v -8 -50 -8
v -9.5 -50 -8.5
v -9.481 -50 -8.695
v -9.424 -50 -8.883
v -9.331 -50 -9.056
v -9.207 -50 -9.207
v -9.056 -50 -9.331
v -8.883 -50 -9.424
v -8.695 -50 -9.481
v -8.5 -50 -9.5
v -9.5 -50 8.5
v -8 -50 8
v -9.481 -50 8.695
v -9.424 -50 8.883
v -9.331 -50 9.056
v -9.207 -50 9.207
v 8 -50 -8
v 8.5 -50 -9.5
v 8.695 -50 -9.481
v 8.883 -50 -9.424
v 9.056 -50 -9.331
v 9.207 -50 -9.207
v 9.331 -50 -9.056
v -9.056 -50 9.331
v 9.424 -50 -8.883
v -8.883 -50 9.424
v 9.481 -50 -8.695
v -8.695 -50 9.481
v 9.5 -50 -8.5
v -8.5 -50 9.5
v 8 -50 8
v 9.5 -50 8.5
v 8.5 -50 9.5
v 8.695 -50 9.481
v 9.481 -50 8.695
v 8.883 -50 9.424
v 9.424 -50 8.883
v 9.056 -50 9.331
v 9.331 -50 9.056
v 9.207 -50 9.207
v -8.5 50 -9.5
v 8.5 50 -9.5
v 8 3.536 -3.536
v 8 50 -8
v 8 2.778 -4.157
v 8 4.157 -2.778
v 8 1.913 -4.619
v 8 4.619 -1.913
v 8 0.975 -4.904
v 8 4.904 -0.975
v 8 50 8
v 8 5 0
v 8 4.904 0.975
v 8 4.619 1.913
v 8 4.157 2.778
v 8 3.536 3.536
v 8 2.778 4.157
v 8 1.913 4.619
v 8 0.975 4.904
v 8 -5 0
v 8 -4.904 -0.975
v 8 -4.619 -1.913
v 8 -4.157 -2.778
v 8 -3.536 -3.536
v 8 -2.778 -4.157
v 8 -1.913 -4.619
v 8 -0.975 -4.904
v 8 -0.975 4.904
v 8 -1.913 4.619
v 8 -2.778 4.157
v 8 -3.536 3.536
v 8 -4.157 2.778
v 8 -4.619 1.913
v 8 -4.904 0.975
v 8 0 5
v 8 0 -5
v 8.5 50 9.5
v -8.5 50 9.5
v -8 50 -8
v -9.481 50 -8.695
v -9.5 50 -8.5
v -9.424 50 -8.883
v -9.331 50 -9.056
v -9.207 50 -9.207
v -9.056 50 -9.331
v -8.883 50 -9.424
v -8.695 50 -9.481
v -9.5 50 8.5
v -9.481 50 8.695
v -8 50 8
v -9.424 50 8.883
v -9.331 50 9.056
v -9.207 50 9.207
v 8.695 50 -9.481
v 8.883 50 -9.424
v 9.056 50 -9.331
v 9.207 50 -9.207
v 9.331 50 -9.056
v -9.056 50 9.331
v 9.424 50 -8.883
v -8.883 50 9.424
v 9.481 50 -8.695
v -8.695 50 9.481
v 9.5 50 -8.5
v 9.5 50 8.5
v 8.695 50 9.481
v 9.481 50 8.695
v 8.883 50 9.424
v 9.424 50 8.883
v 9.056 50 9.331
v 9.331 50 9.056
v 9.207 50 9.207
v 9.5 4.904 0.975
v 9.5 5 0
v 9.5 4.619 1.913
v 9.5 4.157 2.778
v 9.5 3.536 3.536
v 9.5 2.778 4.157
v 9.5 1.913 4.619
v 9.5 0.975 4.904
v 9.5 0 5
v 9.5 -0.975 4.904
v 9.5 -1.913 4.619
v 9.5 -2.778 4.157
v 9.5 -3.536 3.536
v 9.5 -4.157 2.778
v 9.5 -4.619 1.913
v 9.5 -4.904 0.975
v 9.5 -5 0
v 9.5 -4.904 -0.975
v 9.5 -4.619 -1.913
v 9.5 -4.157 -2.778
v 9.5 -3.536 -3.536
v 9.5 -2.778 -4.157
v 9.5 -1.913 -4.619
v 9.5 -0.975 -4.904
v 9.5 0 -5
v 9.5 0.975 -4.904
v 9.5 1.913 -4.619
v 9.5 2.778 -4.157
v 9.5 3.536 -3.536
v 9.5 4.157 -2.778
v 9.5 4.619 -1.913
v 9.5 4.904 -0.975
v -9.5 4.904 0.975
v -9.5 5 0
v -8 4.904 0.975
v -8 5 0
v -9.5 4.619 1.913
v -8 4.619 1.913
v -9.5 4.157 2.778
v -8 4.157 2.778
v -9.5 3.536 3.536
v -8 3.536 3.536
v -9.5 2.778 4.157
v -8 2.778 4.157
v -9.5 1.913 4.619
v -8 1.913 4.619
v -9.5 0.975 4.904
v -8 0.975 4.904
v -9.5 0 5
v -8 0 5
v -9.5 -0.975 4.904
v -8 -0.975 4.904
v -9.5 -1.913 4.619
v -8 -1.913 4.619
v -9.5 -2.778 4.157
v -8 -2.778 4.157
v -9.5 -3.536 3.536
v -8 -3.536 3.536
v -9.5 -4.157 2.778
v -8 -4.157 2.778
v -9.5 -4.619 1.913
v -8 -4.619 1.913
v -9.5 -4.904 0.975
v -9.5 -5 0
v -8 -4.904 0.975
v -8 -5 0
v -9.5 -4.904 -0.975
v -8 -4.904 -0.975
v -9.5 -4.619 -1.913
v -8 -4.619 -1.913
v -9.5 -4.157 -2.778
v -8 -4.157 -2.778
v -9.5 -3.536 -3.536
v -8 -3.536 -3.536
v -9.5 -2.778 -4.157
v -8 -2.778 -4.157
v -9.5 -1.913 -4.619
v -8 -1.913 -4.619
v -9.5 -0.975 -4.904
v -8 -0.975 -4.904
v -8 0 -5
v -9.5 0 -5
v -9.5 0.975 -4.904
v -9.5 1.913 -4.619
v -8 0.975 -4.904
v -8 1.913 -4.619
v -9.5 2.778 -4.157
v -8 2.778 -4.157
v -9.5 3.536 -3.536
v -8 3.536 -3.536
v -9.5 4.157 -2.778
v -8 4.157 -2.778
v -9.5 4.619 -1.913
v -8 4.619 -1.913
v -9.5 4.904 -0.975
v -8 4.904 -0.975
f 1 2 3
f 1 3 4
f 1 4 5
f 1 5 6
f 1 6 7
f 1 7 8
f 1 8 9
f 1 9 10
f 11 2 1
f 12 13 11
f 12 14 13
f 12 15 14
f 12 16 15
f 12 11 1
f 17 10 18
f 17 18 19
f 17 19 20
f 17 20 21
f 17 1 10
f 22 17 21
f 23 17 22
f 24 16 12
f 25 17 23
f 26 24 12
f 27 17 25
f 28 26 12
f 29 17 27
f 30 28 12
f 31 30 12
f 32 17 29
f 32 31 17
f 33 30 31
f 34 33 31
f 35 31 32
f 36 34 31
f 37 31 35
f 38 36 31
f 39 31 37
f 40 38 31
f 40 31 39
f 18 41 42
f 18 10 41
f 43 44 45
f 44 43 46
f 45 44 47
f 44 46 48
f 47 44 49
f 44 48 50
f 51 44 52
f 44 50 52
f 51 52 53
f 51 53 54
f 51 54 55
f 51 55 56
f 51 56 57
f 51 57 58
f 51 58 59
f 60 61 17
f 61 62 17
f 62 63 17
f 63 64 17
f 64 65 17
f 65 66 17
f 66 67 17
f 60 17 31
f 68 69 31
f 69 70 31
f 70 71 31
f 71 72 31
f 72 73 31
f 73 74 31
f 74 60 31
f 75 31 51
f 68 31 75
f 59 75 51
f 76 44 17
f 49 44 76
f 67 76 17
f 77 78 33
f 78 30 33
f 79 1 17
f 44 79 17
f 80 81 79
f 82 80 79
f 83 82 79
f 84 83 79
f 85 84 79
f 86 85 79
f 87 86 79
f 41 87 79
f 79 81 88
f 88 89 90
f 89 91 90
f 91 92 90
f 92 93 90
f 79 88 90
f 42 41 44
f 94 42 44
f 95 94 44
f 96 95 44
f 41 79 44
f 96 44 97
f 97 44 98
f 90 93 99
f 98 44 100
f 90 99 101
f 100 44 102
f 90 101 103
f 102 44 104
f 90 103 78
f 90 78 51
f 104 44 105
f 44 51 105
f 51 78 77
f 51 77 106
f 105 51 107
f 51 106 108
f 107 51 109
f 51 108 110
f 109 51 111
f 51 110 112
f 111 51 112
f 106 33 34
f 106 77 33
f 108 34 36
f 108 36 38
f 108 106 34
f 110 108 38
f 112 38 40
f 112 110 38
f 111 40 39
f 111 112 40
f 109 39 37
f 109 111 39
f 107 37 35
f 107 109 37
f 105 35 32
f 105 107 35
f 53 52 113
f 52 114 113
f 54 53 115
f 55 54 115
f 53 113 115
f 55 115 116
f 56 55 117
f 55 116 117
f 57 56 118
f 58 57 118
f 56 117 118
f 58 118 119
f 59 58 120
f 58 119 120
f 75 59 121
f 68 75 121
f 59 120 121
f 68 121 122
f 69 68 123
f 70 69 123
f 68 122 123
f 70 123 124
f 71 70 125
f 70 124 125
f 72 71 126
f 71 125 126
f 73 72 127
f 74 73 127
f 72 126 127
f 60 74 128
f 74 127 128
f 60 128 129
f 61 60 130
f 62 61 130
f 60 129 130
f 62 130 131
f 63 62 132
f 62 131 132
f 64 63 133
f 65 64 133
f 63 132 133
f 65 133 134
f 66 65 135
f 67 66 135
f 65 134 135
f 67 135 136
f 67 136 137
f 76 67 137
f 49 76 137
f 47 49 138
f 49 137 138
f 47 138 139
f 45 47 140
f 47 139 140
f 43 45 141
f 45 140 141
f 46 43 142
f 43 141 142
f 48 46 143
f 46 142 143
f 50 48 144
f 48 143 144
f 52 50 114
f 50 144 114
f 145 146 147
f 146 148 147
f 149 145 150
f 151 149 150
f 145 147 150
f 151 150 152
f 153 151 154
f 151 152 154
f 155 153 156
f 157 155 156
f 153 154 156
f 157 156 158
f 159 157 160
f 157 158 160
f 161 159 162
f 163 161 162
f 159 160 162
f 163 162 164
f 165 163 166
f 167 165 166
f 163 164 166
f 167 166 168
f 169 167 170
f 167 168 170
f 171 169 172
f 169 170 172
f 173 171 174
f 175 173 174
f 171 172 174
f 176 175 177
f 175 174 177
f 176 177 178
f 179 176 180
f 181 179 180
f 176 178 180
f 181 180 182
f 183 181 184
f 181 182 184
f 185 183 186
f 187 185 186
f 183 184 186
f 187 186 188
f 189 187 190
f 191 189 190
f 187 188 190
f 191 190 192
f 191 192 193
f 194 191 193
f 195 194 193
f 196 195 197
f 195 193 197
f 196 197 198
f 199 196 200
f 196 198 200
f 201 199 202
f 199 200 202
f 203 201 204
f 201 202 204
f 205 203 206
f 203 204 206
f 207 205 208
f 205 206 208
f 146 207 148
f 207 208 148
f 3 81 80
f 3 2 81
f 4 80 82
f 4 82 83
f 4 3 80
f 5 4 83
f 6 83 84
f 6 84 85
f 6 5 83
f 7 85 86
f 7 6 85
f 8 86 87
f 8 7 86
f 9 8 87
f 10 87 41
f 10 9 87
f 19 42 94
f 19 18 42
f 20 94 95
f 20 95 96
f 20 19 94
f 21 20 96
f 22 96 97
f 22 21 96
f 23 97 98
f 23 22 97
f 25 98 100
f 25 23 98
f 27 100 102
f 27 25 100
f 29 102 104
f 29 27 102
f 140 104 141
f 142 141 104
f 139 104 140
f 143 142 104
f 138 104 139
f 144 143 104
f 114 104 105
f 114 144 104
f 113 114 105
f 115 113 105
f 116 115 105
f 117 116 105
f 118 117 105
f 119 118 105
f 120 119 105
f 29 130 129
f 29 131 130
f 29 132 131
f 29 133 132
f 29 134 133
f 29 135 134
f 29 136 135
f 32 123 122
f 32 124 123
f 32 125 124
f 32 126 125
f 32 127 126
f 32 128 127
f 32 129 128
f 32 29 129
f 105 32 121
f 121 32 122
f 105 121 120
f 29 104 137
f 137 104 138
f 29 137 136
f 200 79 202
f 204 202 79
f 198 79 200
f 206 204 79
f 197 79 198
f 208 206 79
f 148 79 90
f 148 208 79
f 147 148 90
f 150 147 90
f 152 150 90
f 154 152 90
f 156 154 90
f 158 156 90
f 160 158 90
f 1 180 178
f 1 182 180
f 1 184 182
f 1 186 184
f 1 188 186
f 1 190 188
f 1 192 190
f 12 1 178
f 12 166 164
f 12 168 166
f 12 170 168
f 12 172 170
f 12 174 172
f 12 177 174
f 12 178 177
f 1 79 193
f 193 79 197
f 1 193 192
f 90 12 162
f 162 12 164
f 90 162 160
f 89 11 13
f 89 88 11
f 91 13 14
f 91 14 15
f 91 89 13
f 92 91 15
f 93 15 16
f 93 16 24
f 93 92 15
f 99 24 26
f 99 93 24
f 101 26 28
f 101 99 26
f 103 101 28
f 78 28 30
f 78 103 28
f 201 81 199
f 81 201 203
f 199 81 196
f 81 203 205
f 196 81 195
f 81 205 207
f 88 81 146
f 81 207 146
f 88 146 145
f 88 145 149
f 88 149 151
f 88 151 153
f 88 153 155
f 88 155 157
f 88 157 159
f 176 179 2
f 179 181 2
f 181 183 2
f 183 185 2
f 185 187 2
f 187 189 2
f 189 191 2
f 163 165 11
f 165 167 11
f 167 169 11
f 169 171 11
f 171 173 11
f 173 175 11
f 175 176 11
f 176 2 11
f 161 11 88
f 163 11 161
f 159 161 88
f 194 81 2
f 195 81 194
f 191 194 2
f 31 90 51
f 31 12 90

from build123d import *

# Parameters (mm, degrees)
F0_W     = 19
F0_H     = 19
F0_W_2   = 16
F0_H_2   = 16
F2_DEPTH = 50
F1_R     = 5
F3_DEPTH = 12.5
F4_R     = 1


with BuildPart() as f2:
    # F0 (on Front) → F2 (new body, symmetric)
    with BuildSketch(Plane.XZ):
        Rectangle(F0_W, F0_H)
        Rectangle(F0_W_2, F0_H_2, mode=Mode.SUBTRACT)
    extrude(amount=F2_DEPTH, both=True)

    # F1 (on Right) → F3 (cut, symmetric)
    with BuildSketch(Plane.YZ):
        Circle(F1_R)
    extrude(amount=F3_DEPTH, both=True, mode=Mode.SUBTRACT)

    # F4
    f4_edges = [f2.edges().sort_by_distance(p)[0] for p in [
        (9.5, 0, 9.5),
        (-9.5, 0, 9.5),
        (9.5, 0, -9.5),
        (-9.5, 0, -9.5),
    ]]
    fillet(f4_edges, radius=F4_R)


solid = f2.part
